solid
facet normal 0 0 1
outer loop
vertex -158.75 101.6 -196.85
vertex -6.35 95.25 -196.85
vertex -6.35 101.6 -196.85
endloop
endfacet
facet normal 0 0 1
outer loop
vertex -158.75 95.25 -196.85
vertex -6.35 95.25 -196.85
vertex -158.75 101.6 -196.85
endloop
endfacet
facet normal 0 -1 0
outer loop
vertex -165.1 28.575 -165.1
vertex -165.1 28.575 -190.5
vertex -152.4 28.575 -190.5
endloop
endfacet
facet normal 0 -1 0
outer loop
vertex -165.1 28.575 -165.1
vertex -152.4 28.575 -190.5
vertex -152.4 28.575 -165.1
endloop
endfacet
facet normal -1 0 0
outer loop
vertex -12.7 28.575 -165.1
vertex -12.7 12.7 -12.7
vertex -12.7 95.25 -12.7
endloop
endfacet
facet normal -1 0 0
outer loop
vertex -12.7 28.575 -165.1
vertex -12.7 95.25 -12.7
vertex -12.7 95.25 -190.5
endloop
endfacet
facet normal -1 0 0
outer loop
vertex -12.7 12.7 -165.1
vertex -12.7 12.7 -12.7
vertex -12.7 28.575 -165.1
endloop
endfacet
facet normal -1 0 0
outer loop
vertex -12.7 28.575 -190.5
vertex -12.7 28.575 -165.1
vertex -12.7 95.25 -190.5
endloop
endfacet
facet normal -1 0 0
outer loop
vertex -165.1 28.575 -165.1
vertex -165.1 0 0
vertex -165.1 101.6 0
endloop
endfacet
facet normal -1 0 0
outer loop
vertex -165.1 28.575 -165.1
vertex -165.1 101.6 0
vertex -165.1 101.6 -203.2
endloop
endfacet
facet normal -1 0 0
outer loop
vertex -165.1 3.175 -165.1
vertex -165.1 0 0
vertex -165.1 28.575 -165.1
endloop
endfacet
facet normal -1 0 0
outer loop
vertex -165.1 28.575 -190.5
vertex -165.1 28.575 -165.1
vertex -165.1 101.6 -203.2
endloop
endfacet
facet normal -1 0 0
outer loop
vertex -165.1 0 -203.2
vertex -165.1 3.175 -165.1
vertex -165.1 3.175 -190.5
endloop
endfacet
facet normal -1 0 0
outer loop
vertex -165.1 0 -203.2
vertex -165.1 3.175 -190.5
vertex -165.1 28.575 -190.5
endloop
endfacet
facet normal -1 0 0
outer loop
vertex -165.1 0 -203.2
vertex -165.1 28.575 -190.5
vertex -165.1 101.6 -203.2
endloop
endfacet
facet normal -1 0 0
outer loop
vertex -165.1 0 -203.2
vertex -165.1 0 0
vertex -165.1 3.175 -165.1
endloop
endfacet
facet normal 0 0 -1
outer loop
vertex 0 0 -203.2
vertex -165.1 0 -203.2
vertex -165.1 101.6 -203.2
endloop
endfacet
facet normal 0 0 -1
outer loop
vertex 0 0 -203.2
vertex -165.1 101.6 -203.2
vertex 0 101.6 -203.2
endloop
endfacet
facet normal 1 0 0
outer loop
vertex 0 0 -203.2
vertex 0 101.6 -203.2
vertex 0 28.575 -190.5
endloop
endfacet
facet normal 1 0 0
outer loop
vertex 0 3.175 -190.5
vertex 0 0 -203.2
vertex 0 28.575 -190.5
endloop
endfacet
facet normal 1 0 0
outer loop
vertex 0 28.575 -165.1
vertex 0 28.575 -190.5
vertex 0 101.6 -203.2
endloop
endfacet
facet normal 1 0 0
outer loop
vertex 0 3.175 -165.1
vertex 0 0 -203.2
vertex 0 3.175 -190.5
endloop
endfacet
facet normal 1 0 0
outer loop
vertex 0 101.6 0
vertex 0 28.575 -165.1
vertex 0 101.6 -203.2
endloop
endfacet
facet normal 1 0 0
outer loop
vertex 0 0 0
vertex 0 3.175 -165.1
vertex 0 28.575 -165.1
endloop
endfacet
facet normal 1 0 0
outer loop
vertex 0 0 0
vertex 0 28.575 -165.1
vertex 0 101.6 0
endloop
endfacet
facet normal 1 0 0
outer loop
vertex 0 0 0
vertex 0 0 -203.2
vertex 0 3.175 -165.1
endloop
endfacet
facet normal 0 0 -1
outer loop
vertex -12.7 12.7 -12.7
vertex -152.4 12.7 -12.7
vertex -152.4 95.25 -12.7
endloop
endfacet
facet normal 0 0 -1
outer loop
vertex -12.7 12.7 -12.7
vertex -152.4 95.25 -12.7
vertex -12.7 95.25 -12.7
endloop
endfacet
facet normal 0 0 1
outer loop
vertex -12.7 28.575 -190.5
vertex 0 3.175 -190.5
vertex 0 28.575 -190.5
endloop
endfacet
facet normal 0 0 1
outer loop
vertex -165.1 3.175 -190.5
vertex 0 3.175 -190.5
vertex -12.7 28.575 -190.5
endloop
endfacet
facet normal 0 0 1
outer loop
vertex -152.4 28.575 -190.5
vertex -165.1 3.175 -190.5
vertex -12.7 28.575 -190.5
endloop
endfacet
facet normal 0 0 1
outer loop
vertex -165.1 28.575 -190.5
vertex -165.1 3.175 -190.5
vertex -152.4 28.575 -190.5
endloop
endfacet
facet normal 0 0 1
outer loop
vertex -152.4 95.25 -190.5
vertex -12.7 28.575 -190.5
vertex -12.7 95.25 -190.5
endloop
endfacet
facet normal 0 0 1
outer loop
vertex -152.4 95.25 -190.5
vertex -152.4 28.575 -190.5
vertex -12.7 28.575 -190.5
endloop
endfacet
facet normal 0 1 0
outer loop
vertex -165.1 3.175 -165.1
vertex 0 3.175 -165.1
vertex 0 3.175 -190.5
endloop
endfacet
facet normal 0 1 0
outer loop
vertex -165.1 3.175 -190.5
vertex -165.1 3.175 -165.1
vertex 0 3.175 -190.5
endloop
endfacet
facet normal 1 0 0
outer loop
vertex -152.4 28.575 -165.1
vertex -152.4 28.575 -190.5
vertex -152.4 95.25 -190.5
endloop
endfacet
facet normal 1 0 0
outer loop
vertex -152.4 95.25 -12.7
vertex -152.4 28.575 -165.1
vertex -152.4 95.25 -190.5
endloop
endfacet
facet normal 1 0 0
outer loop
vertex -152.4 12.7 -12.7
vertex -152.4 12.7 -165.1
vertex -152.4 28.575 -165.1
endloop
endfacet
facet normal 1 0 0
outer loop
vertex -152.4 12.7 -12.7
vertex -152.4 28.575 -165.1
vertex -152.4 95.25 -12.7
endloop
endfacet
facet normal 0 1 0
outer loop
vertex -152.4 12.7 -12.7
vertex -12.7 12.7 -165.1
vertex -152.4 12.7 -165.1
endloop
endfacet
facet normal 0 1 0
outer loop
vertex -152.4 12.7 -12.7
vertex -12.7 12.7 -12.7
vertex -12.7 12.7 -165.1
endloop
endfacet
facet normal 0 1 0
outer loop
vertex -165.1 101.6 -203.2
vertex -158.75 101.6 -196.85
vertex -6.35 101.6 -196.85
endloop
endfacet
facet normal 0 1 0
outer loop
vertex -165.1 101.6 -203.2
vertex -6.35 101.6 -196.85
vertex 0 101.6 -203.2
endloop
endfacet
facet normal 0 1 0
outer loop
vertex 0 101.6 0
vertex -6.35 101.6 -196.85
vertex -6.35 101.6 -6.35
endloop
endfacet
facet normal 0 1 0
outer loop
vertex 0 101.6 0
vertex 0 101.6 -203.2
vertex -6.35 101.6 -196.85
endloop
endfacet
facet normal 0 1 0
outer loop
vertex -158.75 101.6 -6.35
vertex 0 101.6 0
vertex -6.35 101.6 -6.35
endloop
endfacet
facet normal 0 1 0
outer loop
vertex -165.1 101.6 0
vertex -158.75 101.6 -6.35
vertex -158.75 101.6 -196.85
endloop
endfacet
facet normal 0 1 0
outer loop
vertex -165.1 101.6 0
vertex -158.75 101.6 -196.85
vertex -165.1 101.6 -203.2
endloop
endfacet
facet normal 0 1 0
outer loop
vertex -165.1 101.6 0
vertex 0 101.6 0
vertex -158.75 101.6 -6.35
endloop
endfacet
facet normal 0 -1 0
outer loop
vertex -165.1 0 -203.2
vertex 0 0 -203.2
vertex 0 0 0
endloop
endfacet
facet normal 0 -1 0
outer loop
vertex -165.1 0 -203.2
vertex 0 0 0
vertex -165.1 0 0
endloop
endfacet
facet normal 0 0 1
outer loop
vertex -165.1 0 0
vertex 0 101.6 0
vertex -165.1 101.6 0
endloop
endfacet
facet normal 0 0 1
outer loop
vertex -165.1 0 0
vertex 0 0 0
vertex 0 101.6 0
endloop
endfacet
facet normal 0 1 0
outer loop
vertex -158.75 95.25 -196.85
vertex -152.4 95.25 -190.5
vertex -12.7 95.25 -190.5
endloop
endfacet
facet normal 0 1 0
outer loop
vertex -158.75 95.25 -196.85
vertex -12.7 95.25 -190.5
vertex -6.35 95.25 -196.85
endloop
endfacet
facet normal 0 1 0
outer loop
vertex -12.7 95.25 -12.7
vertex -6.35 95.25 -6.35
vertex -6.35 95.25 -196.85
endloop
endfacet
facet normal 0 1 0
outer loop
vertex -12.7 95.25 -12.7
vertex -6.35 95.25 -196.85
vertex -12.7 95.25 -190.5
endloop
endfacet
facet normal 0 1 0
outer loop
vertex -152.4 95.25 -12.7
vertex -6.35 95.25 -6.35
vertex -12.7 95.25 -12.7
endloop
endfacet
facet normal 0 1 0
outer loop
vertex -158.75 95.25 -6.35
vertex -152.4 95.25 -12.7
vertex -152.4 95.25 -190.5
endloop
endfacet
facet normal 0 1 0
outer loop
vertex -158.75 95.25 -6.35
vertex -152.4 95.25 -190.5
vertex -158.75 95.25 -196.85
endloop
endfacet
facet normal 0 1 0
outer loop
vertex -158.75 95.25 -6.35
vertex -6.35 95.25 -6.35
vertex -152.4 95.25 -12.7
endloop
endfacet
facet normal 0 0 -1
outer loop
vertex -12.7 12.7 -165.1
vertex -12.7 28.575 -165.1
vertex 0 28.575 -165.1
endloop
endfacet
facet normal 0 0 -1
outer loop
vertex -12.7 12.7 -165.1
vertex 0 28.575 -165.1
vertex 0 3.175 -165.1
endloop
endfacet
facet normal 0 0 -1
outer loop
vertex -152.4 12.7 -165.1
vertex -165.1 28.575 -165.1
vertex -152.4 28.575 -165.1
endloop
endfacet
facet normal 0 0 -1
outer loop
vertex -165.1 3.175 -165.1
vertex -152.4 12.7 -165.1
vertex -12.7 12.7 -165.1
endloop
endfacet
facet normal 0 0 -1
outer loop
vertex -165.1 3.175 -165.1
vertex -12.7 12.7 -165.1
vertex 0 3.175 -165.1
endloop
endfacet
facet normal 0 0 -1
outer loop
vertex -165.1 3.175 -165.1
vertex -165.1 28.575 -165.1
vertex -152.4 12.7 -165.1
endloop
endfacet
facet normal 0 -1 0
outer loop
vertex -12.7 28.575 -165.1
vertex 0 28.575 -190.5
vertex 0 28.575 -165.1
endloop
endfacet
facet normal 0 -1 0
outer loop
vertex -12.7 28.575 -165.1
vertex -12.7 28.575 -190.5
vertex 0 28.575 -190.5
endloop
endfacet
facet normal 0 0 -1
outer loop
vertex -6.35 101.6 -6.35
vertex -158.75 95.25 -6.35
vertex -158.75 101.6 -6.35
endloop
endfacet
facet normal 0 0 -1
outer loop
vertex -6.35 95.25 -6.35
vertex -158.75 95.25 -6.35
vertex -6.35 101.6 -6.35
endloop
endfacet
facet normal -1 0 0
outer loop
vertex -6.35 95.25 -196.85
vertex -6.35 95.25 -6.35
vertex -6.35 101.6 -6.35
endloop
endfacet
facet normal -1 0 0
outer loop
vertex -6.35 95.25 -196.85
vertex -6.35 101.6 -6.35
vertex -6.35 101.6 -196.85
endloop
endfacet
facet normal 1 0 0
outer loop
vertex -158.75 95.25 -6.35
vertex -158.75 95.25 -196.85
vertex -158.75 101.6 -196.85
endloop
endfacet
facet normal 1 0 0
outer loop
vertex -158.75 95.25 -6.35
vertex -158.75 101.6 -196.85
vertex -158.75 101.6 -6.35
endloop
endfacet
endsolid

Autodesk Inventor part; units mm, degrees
ref_plane "YZ Plane" through (0, 0, 0) normal (1, 0, 0) x (0, 1, 0)
ref_plane "XZ Plane" through (0, 0, 0) normal (0, 1, 0) x (-1, 0, 0)
ref_plane "XY Plane" through (0, 0, 0) normal (0, 0, 1) x (1, 0, 0)
sketch "Sketch1" plane through (0, 0, 0) normal (0, 1, 0) x (-1, 0, 0)
  line L0 (0, 0) -> (165.1, 0)
  line L1 (165.1, 0) -> (165.1, -203.2)
  line L2 (165.1, -203.2) -> (0, -203.2)
  line L3 (0, -203.2) -> (0, 0)
  line L4 (158.75, -196.85) -> (158.75, -6.35)
  line L5 (158.75, -6.35) -> (6.35, -6.35)
  line L6 (6.35, -6.35) -> (6.35, -196.85)
  line L7 (6.35, -196.85) -> (158.75, -196.85)
  line L8 (152.4, -190.5) -> (152.4, -12.7)
  line L9 (152.4, -12.7) -> (12.7, -12.7)
  line L10 (12.7, -12.7) -> (12.7, -190.5)
  line L11 (12.7, -190.5) -> (152.4, -190.5)
  dimension "d0" = 203.2
  dimension "d1" = 165.1
  dimension "d2" = 6.35
  dimension "d3" = 12.7
extrude "Extrusion1" add sketch "Sketch1" along normal blind 12.7 contours L0 L1 L2 L3 | L7 L6 L5 L4 | L11 L10 L9 L8
extrude "Extrusion2" add sketch "Sketch1" along normal blind 101.6 contours L0 L1 L2 L3
extrude "Extrusion3" add sketch "Sketch1" along normal blind 95.25 contours L7 L6 L5 L4
sketch "Sketch2" plane through (-165.1, 0, -203.2) normal (-1, 0, 0) x (0, 0, 1)
  line L0 (12.7, 12.7) -> (190.5, 12.7) projected
  line L1 (12.7, 28.575) -> (38.1, 28.575)
  line L2 (38.1, 28.575) -> (38.1, 3.175)
  line L3 (38.1, 3.175) -> (12.7, 3.175)
  line L4 (12.7, 3.175) -> (12.7, 28.575)
  line L5 (0, 0) -> (203.2, 0) projected
  dimension "d10" = 3.175
  dimension "d11" = 25.4
  dimension "d12" = 25.4
extrude "Extrusion4" cut sketch "Sketch2" against normal through all
properties part number "OGRobotBase" material "ABS Plastic"
